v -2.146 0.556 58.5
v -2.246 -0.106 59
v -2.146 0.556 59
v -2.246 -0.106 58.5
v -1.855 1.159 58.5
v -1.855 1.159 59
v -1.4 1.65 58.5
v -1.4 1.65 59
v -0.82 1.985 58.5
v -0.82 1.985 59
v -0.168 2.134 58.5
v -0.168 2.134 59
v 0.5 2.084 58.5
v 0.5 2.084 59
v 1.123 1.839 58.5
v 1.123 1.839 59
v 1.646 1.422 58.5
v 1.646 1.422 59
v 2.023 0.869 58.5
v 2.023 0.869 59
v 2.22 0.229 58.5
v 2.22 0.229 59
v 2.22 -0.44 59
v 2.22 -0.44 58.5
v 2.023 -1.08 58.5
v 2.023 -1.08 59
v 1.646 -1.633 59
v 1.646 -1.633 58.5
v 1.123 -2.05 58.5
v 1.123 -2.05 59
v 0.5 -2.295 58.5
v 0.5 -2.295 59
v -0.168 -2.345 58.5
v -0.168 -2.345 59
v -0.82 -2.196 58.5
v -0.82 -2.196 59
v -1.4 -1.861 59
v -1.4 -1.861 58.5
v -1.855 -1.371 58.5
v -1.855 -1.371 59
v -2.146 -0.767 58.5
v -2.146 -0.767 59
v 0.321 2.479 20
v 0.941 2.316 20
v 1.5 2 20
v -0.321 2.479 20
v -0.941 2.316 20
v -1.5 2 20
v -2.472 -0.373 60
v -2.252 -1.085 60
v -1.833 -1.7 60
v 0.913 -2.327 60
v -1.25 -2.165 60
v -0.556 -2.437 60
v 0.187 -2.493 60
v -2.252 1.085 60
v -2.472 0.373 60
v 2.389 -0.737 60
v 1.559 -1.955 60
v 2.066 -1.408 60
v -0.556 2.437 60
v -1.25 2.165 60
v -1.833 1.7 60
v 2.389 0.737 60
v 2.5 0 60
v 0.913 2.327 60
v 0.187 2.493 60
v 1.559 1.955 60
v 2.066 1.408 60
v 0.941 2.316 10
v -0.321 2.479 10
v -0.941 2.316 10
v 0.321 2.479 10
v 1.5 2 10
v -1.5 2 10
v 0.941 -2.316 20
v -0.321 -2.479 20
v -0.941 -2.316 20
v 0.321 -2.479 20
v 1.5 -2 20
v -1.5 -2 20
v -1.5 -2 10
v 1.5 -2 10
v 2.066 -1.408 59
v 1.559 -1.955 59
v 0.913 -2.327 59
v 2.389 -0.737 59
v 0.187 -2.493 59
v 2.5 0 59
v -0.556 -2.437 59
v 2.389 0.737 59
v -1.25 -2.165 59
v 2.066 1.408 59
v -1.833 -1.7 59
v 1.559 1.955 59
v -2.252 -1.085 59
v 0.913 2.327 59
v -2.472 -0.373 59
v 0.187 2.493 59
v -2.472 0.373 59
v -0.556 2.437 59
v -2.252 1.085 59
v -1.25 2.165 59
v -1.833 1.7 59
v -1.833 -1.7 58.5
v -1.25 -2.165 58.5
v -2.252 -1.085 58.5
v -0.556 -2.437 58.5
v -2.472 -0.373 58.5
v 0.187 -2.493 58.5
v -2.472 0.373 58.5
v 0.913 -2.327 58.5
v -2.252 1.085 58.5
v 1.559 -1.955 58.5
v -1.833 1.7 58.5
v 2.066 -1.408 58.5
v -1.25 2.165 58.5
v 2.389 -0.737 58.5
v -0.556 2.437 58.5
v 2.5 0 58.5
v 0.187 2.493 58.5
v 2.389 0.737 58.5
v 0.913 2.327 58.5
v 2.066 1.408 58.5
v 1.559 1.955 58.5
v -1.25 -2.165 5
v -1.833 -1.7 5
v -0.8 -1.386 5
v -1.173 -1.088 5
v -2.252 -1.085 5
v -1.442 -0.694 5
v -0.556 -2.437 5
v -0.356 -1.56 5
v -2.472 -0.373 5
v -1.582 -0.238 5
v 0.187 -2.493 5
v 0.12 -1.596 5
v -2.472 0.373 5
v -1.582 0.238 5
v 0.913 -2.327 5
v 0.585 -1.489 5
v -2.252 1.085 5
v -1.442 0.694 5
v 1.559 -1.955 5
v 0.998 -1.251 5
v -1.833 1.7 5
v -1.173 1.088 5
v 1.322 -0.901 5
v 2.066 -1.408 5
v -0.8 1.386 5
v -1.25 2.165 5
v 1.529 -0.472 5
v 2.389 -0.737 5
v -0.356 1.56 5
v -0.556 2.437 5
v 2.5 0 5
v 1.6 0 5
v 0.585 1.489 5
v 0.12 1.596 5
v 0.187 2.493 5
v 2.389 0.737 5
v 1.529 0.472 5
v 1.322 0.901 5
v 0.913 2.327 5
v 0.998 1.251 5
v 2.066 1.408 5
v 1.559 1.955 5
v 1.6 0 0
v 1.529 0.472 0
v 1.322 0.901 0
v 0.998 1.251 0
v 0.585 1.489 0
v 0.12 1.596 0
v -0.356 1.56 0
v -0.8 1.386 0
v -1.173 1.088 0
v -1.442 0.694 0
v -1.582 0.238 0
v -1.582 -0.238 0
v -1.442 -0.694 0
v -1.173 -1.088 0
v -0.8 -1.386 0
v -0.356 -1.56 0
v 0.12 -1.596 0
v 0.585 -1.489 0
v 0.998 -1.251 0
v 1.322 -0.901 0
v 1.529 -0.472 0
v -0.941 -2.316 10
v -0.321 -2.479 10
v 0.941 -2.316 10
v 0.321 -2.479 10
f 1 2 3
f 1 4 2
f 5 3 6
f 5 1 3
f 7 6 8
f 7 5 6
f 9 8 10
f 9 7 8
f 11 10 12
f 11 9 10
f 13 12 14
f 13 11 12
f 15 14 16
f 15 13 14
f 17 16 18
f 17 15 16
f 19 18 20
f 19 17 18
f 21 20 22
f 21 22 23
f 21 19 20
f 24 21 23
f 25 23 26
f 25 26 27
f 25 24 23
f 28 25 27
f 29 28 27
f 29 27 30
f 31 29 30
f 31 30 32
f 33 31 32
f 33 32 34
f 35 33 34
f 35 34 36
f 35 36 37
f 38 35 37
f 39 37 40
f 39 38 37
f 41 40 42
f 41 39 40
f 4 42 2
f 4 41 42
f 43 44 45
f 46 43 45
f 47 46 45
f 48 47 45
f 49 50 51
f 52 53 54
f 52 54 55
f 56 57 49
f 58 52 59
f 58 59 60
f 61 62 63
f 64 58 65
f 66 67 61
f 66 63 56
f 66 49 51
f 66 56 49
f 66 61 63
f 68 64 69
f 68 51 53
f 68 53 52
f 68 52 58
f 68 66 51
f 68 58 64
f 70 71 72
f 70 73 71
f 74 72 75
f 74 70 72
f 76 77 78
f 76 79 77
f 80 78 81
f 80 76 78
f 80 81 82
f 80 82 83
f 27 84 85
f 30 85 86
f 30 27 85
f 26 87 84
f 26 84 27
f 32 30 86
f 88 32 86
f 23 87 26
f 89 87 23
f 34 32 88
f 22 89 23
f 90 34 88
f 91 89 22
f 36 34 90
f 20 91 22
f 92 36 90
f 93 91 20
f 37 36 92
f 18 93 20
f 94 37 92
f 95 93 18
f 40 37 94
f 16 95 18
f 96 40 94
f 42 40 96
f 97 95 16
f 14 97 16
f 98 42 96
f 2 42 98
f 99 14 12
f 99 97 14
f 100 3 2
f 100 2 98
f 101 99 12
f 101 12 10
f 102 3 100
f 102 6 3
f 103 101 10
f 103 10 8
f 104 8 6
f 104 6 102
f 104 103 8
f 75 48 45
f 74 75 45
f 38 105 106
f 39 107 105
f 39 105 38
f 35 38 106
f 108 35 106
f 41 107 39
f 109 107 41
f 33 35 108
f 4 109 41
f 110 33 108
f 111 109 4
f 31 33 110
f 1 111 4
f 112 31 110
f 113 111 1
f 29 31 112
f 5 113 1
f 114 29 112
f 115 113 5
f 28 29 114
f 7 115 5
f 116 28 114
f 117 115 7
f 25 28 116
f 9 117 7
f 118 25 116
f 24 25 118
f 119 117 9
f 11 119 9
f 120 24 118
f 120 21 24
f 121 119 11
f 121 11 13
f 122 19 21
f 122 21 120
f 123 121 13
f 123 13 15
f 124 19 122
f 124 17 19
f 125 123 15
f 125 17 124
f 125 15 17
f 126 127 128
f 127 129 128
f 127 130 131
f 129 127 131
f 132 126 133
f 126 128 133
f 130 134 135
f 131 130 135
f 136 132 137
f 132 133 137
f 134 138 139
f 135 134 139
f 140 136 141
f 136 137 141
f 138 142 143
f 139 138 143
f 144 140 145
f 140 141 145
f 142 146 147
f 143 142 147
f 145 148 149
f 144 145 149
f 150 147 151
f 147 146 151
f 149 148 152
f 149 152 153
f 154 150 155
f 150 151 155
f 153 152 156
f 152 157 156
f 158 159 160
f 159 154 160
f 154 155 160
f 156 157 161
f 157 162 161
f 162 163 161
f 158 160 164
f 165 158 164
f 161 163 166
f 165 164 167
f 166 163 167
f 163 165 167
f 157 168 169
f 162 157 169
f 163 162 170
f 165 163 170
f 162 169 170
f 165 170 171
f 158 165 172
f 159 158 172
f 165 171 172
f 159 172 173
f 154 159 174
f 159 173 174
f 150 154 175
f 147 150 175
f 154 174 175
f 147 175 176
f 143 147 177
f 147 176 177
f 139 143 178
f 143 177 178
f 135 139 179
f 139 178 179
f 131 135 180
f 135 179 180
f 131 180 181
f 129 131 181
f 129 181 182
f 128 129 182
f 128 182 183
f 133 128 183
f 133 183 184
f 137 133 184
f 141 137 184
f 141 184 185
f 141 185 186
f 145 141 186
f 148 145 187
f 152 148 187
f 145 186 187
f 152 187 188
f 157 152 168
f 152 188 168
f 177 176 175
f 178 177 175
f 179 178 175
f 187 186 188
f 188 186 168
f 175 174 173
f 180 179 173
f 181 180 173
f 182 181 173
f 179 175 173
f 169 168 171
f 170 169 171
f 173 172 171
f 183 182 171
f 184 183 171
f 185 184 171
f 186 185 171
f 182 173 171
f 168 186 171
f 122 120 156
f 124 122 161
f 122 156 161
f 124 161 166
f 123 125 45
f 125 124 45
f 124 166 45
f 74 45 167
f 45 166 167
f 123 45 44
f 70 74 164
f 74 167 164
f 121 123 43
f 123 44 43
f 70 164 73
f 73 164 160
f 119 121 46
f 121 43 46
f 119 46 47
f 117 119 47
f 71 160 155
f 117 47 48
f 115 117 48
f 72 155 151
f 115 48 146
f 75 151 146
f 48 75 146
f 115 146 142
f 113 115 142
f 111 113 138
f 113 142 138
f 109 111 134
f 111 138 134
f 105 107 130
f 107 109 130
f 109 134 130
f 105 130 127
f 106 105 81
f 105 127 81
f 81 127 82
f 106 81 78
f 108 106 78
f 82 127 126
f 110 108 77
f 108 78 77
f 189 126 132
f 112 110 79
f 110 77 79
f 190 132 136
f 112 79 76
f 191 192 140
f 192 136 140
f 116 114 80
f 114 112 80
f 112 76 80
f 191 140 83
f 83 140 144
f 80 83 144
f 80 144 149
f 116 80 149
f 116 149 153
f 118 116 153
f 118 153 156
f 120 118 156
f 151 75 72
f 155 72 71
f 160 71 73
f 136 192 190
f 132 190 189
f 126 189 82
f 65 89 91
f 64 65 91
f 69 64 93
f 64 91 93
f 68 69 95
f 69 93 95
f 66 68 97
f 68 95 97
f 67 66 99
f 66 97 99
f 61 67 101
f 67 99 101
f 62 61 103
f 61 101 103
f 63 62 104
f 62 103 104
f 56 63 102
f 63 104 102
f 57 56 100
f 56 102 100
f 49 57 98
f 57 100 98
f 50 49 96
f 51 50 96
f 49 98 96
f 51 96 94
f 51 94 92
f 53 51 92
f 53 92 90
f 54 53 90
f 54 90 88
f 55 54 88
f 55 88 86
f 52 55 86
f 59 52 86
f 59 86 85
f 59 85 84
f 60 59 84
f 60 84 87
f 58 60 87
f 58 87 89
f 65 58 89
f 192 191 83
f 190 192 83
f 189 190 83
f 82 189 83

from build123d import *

# Parameters (mm, degrees)
SKETCH1_R           = 1.6
BOSS_EXTRUDE1_DEPTH = 5
SKETCH2_R           = 2.5
BOSS_EXTRUDE2_DEPTH = 55
SKETCH5_W           = 8.290876423
SKETCH5_H           = 10
CUT_EXTRUDE1_DEPTH  = 0.5


with BuildPart() as part:
    # Sketch1 → Boss-Extrude1 (new body)
    with BuildSketch(Plane.XY):
        Circle(SKETCH1_R)
    extrude(amount=BOSS_EXTRUDE1_DEPTH)

    # Sketch2 → Boss-Extrude2 (add)
    with BuildSketch(Plane.XY.offset(5)):
        Circle(SKETCH2_R)
    extrude(amount=BOSS_EXTRUDE2_DEPTH)

    # Sketch4 → Groove for ANSI B27.7 - 3BM1-8, Basic Internal Retaining Ring1 (revolve, cut)
    with BuildSketch(Plane(origin=(0, 0, 54), x_dir=(0, 1, 0), z_dir=(-1, 0, 0)), mode=Mode.PRIVATE) as groove_for_ansi_b27_7_3bm1_8_basic_in_sk:
        with BuildLine():
            Line((4.1, -5), (2.14, -5))
            Line((2.14, -5), (2.14, -4.5))
            Line((2.14, -4.5), (4.1, -4.5))
            ThreePointArc((4.1, -4.5), (4.170710678, -4.529289322), (4.2, -4.6))
            Line((4.2, -4.6), (4.2, -4.9))
            ThreePointArc((4.2, -4.9), (4.170710678, -4.970710678), (4.1, -5))
        make_face()
    revolve(groove_for_ansi_b27_7_3bm1_8_basic_in_sk.sketch.rotate(Axis((0, -0.105559952, 104), (0, 0, -1)), 270), axis=Axis((0, -0.105559952, 104), (0, 0, -1)), mode=Mode.SUBTRACT)

    # Sketch5 → Cut-Extrude1 (cut)
    with BuildSketch(Plane.XZ.offset(2.5)):
        with Locations((-0.404897295, 15)):
            Rectangle(SKETCH5_W, SKETCH5_H)
    cut_extrude1 = extrude(amount=-CUT_EXTRUDE1_DEPTH, mode=Mode.SUBTRACT)

    # Mirror1: Cut-Extrude1 across plane
    add(cut_extrude1.mirror(Plane.ZX), mode=Mode.SUBTRACT)


solid = part.part
